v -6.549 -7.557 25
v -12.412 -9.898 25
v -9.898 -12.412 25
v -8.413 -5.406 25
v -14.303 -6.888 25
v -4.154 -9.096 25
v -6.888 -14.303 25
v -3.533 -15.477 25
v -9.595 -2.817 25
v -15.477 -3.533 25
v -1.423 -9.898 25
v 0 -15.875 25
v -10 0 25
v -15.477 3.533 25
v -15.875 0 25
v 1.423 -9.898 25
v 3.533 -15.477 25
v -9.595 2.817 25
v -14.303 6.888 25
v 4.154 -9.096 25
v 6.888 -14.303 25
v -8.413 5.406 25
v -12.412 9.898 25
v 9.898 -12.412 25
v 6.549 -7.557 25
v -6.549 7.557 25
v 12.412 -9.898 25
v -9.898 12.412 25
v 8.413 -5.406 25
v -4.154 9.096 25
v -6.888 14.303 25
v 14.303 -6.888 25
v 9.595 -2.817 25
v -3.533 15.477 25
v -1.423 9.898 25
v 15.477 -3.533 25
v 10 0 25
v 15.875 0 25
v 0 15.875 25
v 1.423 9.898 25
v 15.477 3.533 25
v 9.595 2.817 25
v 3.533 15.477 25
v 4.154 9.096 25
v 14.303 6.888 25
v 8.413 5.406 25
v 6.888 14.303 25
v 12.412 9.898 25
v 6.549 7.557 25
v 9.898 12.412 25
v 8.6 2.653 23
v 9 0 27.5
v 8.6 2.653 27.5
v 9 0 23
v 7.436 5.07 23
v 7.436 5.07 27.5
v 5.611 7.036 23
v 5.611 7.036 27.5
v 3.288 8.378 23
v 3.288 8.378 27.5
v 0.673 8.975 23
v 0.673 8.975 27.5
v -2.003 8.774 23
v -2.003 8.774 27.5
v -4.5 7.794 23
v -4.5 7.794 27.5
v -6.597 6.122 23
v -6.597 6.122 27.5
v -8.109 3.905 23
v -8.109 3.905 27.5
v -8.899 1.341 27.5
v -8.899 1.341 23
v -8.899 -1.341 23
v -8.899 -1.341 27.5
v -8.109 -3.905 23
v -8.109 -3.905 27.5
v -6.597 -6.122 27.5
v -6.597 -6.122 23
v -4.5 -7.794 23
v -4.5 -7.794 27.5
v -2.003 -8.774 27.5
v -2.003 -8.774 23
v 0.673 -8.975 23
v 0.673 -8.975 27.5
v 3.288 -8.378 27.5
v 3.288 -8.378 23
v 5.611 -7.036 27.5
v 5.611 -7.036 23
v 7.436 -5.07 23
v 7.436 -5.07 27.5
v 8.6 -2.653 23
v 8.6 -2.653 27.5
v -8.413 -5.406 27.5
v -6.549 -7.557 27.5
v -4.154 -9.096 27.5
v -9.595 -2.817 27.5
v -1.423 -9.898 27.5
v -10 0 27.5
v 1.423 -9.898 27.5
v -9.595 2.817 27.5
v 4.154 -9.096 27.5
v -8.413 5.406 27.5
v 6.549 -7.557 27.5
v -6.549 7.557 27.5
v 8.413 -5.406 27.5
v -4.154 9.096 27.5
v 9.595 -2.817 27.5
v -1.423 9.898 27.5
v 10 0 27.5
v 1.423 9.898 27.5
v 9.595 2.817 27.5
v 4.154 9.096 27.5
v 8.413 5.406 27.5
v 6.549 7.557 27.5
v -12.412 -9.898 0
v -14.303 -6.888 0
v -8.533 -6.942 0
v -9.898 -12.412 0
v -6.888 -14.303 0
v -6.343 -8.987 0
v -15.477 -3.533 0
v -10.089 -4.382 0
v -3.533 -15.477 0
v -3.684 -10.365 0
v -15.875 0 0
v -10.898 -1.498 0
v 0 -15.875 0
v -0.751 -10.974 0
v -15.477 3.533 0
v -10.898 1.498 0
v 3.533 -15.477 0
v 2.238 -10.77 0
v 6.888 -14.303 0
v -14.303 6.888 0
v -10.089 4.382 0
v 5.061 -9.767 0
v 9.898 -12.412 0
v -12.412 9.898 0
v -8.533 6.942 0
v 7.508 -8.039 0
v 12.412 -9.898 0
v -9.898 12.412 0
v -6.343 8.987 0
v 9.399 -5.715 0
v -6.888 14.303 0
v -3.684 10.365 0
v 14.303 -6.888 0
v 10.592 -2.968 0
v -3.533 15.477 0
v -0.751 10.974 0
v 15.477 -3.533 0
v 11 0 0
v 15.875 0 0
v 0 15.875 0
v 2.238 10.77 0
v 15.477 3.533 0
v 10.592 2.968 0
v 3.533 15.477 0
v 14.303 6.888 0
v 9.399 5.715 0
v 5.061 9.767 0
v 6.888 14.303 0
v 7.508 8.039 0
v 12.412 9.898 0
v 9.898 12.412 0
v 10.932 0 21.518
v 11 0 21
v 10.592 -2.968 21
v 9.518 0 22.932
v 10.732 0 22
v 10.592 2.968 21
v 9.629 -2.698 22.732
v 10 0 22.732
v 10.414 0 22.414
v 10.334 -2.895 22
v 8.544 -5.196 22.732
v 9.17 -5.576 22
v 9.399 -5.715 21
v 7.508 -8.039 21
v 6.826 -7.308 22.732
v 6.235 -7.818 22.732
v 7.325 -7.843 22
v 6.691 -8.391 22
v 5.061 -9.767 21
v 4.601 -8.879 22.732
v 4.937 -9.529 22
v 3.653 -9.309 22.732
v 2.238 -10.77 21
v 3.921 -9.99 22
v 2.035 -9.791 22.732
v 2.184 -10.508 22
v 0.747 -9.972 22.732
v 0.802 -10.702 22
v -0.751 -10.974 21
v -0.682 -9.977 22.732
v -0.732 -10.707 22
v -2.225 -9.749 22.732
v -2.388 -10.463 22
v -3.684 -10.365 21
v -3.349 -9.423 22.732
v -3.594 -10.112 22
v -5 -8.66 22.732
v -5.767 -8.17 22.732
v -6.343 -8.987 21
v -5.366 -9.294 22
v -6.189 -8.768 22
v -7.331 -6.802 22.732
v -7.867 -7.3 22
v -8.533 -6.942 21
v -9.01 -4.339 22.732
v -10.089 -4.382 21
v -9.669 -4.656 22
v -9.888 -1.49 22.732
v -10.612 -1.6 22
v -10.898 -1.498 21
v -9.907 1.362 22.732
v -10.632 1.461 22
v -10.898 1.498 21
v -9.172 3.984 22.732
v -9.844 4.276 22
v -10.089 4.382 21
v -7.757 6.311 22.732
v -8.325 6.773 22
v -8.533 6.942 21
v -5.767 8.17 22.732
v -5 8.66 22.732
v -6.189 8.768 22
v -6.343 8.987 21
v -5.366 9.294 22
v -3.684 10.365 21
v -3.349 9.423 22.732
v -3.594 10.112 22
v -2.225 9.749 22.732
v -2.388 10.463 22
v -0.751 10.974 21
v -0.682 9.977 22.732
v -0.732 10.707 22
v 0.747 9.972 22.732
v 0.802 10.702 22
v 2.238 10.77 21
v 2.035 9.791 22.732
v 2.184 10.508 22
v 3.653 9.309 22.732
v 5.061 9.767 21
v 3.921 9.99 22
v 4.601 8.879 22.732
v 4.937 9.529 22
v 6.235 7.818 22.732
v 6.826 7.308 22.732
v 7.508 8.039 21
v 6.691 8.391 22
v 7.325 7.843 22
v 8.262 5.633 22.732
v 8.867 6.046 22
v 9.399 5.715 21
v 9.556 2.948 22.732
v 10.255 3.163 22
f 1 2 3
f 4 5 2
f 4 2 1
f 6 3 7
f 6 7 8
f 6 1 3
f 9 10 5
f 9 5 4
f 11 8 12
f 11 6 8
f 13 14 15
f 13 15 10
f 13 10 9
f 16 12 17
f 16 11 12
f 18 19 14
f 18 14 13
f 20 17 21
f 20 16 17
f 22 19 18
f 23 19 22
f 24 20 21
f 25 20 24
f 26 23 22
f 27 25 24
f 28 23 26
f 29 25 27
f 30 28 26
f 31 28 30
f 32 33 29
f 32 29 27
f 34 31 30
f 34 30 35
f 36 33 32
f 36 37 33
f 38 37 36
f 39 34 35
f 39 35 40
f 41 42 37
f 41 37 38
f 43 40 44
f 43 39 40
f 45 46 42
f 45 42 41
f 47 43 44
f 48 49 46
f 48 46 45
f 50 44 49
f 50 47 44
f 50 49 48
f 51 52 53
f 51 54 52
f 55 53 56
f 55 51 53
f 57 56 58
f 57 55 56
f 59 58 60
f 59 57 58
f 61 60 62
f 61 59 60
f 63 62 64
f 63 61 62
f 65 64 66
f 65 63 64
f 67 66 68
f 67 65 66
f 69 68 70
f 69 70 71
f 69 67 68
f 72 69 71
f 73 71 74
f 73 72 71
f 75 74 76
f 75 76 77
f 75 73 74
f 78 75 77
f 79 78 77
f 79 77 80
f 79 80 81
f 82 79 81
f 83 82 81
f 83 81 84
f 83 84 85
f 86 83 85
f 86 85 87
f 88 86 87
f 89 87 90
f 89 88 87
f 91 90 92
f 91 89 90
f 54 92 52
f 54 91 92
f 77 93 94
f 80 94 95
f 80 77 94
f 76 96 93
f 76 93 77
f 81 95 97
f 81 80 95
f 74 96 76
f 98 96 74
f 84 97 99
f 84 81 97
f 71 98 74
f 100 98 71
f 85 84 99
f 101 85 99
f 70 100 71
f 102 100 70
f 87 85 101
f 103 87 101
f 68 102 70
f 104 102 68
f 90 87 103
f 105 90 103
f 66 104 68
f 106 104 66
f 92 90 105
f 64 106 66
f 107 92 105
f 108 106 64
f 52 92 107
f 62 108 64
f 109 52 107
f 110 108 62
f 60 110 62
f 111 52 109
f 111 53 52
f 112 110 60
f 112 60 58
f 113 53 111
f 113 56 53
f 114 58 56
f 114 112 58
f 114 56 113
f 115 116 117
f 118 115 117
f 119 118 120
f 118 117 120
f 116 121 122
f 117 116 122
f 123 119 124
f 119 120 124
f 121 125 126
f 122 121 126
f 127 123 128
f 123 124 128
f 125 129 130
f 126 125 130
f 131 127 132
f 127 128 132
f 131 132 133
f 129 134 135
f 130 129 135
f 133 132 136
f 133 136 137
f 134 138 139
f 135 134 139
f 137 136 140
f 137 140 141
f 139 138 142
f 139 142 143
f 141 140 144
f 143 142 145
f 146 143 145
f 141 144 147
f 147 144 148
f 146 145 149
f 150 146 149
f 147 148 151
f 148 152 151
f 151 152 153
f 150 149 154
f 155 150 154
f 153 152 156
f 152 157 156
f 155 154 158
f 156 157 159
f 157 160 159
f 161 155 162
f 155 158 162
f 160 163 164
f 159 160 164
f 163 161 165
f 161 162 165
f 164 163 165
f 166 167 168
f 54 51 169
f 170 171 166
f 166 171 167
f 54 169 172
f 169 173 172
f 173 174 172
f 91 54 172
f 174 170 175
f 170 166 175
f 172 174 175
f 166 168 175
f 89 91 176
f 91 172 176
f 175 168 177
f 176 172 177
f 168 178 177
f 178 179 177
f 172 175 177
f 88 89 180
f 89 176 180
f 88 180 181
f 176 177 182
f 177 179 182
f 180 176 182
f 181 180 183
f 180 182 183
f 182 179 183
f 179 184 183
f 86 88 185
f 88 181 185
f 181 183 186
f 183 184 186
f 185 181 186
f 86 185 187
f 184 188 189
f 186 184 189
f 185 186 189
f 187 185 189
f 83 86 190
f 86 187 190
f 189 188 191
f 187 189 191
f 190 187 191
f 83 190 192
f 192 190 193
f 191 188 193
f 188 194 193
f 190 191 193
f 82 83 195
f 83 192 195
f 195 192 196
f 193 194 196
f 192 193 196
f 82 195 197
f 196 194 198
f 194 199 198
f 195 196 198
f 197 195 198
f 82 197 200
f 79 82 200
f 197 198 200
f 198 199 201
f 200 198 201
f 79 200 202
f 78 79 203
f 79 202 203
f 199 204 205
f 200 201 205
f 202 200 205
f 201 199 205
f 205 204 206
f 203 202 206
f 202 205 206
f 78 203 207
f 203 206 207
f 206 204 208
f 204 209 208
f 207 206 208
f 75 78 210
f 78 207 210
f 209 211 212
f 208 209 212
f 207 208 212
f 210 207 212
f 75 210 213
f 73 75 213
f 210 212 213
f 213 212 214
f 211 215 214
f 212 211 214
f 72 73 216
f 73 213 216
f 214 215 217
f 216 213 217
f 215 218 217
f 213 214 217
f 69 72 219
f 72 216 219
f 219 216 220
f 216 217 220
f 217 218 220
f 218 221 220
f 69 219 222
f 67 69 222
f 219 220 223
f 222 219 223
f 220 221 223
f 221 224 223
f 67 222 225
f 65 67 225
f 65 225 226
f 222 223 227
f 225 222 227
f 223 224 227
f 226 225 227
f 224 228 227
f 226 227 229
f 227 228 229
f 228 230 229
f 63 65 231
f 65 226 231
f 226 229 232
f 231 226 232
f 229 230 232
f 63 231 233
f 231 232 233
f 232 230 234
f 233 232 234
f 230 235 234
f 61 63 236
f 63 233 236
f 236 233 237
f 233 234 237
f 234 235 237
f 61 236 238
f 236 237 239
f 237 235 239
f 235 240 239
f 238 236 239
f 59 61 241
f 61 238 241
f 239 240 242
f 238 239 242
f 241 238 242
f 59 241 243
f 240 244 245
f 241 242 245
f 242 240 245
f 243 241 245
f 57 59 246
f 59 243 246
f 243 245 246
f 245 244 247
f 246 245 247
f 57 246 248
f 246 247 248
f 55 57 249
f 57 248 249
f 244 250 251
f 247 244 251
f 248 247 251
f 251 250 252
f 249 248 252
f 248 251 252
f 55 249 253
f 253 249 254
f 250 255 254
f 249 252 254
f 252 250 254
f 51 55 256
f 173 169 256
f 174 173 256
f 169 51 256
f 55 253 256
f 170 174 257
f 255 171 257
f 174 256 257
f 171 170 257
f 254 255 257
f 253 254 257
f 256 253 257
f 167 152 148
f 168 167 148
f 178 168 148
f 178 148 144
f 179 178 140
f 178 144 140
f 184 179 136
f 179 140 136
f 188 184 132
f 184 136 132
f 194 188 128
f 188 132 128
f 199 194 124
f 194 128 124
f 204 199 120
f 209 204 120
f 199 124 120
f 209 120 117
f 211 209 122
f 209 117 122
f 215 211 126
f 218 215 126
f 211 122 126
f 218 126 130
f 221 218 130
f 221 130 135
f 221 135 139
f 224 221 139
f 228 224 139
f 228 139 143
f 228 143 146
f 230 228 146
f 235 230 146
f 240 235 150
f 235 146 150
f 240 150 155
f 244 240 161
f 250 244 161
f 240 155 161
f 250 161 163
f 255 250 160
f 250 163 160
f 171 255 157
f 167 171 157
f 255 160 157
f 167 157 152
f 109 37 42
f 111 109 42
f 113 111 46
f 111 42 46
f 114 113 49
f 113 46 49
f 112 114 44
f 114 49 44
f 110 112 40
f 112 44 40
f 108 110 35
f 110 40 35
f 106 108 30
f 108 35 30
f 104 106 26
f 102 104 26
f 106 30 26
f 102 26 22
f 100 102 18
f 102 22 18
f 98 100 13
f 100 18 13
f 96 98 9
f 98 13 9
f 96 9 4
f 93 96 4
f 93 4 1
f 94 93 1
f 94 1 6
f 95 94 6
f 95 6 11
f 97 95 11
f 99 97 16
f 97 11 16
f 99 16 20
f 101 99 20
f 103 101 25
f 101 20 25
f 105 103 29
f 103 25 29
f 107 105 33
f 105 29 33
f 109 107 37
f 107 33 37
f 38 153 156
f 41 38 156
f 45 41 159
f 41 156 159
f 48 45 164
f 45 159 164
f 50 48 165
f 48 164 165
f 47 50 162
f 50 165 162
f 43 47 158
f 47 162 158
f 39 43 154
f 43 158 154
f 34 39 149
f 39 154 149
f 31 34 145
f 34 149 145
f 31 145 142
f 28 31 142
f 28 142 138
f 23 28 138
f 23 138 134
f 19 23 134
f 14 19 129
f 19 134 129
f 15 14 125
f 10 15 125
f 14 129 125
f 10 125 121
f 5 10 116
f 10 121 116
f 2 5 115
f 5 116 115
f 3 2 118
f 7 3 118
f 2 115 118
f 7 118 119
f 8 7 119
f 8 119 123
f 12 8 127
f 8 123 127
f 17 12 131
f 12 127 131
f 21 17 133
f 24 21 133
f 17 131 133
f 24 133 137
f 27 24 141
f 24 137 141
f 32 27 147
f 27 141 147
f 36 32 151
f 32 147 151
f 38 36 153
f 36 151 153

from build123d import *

# Parameters (mm, degrees)
F0_R     = 15.875
F0_R_2   = 9
F1_DEPTH = 25
F2_R     = 10
F2_R_2   = 9
F3_DEPTH = 2.5
F4_R     = 11
F4_R_2   = 9
F5_DEPTH = 23
F6_R     = 1.99999
F7_DEPTH = 2.5


# Not quite as in the source:
# - a fillet or chamfer is up to 0.001 mm smaller than in the source, because OpenCascade refuses the exact size


with BuildPart() as f1:
    # F0 (on Top) → F1 (new body)
    with BuildSketch(Plane.XY):
        Circle(F0_R)
        Circle(F0_R_2, mode=Mode.SUBTRACT)
    extrude(amount=F1_DEPTH)

    # F2 (on face) → F3 (join)
    with BuildSketch(Plane.XY.offset(25)):
        Circle(F2_R)
        Circle(F2_R_2, mode=Mode.SUBTRACT)
    extrude(amount=F3_DEPTH)

    # F4 (on face) → F5 (cut)
    with BuildSketch(Plane(origin=(0, 0, 0), x_dir=(1, 0, 0), z_dir=(0, 0, -1))):
        Circle(F4_R)
        Circle(F4_R_2, mode=Mode.SUBTRACT)
    extrude(amount=-F5_DEPTH, mode=Mode.SUBTRACT)

    # F6 (radius 2 in the source; OpenCascade refuses exactly that, so slightly less here)
    f6_edges = [f1.edges().sort_by_distance(p)[0] for p in [
        (-11, 0, 23),
    ]]
    fillet(f6_edges, radius=F6_R)

    # F2 (on face) → F7 (join)
    with BuildSketch(Plane.XY.offset(25)):
        Circle(F2_R)
        Circle(F2_R_2, mode=Mode.SUBTRACT)
    extrude(amount=F7_DEPTH)


solid = f1.part
